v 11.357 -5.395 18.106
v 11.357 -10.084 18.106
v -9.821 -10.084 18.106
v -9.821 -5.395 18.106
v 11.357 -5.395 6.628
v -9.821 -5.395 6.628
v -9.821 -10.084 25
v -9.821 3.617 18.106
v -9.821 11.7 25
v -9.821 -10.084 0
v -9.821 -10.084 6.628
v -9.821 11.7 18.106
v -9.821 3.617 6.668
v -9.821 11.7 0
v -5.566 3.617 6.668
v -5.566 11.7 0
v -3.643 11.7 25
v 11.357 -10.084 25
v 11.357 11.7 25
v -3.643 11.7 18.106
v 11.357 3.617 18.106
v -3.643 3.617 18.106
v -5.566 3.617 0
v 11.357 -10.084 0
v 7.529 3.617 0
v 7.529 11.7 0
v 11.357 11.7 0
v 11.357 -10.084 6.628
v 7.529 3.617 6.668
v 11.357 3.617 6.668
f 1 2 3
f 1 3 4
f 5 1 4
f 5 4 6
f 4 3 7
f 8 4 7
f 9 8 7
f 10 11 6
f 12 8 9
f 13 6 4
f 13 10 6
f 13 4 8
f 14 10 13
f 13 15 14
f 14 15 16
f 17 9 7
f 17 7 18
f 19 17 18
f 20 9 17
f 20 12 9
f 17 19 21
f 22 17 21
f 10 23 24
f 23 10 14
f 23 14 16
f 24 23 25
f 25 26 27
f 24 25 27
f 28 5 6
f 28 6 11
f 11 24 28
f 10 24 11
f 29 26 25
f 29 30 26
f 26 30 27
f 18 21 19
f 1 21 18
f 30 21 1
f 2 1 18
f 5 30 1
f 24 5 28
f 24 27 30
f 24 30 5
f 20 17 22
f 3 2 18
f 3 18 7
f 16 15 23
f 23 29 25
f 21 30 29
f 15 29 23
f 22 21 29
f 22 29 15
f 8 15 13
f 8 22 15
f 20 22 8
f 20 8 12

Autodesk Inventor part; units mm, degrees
ref_plane "YZ Plane" through (0, 0, 0) normal (1, 0, 0) x (0, 1, 0)
ref_plane "XZ Plane" through (0, 0, 0) normal (0, 1, 0) x (-1, 0, 0)
ref_plane "XY Plane" through (0, 0, 0) normal (0, 0, 1) x (1, 0, 0)
sketch "스케치1" plane through (0, 0, 0) normal (0, 0, 1) x (1, 0, 0)
  line L0 (-9.8208, 11.7001) -> (11.3566, 11.7001)
  line L1 (11.3566, 11.7001) -> (11.3566, -10.0835)
  line L2 (11.3566, -10.0835) -> (-9.8208, -10.0835)
  line L3 (-9.8208, -10.0835) -> (-9.8208, 11.7001)
  point P0 (0, 0)
extrude "돌출1" add sketch "스케치1" along normal blind 25
sketch "스케치2" plane through (11.3566, -10.0835, 0) normal (1, 0, 0) x (0, 0, -1)
  line L0 (0, 0) -> (-25, 0) projected
  line L1 (-18.1058, 4.6881) -> (-6.628, 4.6881)
  line L2 (-6.628, 4.6881) -> (-6.628, 0)
  line L3 (-6.628, 0) -> (-18.1058, 0)
  line L4 (-18.1058, 0) -> (-18.1058, 4.6881)
  point P0 (0, 10.0835)
extrude "돌출2" cut sketch "스케치2" against normal blind 25
sketch "스케치3" plane through (11.3566, -10.0835, 0) normal (1, 0, 0) x (0, 0, -1)
  line L0 (0, 21.7836) -> (-25, 21.7836) projected
  line L1 (-18.1058, 21.7836) -> (-6.6684, 21.7836)
  line L2 (-6.6684, 21.7836) -> (-6.6684, 13.7006)
  line L3 (-6.6684, 13.7006) -> (-18.1058, 13.7006)
  line L4 (-18.1058, 13.7006) -> (-18.1058, 21.7836)
  point P0 (0, 10.0835)
extrude "돌출3" cut sketch "스케치3" against normal blind 25
sketch "스케치4" plane through (11.3566, -10.0835, 0) normal (1, 0, 0) x (0, 0, -1)
  point P0 (0, 10.0835)
sketch "스케치5" plane through (-9.8208, 11.7001, 0) normal (0, 1, 0) x (1, 0, 0)
  line L0 (21.1774, -6.628) -> (0, -6.628) projected
  line L1 (0, 0) -> (21.1774, 0) projected
  line L2 (4.1053, -6.628) -> (17.5214, -6.628)
  line L3 (17.5214, -6.628) -> (17.5214, 0)
  line L4 (17.5214, 0) -> (4.1053, 0)
  line L5 (4.1053, 0) -> (4.1053, -6.628)
  point P0 (9.8208, 0)
sketch "스케치6" plane through (11.3566, 3.6171, 6.6684) normal (0, 0, 1) x (1, 0, 0)
  line L0 (-21.1774, 8.083) -> (0, 8.083) projected
  line L1 (0, 0) -> (-21.1774, 0) projected
  line L2 (-16.9228, 8.083) -> (-3.828, 8.083)
  line L3 (-3.828, 8.083) -> (-3.828, 0)
  line L4 (-3.828, 0) -> (-16.9228, 0)
  line L5 (-16.9228, 0) -> (-16.9228, 8.083)
  point P0 (-11.3566, -3.6171)
extrude "돌출4" cut sketch "스케치6" against normal blind 10
sketch "스케치7" plane through (11.3566, -10.0835, 0) normal (1, 0, 0) x (0, 0, -1)
  line L0 (-6.6684, 13.7006) -> (-18.1058, 13.7006) projected
  line L1 (0, 21.7836) -> (0, 13.7006) projected
  line L2 (-6.6684, 13.7006) -> (0, 21.7836)
  line L3 (-6.6684, 13.7006) -> (-6.6684, 21.7836)
  line L4 (0, 21.7836) -> (0, 0) projected
  line L5 (-6.6684, 21.7836) -> (0, 21.7836)
  point P0 (0, 10.0835)
extrude "돌출5" cut sketch "스케치7" against normal blind 50
sketch "스케치8" plane through (11.3566, -10.0835, 25) normal (1, 0, 0) x (0, 0, -1)
  line L0 (0, 21.7836) -> (0, 0) projected
  line L1 (6.8942, 13.7006) -> (18.3316, 13.7006) projected
  line L2 (0, 21.7836) -> (6.8942, 13.7006)
  line L3 (6.8942, 21.7836) -> (6.8942, 13.7006) projected
  line L4 (6.8942, 13.7006) -> (6.8942, 21.7836)
  line L5 (6.8942, 21.7836) -> (0, 21.7836) projected
  line L6 (6.8942, 21.7836) -> (0, 21.7836)
  point P0 (25, 10.0835)
extrude "돌출6" cut sketch "스케치8" against normal blind 15
properties part number "240510_3Dsketch09"
